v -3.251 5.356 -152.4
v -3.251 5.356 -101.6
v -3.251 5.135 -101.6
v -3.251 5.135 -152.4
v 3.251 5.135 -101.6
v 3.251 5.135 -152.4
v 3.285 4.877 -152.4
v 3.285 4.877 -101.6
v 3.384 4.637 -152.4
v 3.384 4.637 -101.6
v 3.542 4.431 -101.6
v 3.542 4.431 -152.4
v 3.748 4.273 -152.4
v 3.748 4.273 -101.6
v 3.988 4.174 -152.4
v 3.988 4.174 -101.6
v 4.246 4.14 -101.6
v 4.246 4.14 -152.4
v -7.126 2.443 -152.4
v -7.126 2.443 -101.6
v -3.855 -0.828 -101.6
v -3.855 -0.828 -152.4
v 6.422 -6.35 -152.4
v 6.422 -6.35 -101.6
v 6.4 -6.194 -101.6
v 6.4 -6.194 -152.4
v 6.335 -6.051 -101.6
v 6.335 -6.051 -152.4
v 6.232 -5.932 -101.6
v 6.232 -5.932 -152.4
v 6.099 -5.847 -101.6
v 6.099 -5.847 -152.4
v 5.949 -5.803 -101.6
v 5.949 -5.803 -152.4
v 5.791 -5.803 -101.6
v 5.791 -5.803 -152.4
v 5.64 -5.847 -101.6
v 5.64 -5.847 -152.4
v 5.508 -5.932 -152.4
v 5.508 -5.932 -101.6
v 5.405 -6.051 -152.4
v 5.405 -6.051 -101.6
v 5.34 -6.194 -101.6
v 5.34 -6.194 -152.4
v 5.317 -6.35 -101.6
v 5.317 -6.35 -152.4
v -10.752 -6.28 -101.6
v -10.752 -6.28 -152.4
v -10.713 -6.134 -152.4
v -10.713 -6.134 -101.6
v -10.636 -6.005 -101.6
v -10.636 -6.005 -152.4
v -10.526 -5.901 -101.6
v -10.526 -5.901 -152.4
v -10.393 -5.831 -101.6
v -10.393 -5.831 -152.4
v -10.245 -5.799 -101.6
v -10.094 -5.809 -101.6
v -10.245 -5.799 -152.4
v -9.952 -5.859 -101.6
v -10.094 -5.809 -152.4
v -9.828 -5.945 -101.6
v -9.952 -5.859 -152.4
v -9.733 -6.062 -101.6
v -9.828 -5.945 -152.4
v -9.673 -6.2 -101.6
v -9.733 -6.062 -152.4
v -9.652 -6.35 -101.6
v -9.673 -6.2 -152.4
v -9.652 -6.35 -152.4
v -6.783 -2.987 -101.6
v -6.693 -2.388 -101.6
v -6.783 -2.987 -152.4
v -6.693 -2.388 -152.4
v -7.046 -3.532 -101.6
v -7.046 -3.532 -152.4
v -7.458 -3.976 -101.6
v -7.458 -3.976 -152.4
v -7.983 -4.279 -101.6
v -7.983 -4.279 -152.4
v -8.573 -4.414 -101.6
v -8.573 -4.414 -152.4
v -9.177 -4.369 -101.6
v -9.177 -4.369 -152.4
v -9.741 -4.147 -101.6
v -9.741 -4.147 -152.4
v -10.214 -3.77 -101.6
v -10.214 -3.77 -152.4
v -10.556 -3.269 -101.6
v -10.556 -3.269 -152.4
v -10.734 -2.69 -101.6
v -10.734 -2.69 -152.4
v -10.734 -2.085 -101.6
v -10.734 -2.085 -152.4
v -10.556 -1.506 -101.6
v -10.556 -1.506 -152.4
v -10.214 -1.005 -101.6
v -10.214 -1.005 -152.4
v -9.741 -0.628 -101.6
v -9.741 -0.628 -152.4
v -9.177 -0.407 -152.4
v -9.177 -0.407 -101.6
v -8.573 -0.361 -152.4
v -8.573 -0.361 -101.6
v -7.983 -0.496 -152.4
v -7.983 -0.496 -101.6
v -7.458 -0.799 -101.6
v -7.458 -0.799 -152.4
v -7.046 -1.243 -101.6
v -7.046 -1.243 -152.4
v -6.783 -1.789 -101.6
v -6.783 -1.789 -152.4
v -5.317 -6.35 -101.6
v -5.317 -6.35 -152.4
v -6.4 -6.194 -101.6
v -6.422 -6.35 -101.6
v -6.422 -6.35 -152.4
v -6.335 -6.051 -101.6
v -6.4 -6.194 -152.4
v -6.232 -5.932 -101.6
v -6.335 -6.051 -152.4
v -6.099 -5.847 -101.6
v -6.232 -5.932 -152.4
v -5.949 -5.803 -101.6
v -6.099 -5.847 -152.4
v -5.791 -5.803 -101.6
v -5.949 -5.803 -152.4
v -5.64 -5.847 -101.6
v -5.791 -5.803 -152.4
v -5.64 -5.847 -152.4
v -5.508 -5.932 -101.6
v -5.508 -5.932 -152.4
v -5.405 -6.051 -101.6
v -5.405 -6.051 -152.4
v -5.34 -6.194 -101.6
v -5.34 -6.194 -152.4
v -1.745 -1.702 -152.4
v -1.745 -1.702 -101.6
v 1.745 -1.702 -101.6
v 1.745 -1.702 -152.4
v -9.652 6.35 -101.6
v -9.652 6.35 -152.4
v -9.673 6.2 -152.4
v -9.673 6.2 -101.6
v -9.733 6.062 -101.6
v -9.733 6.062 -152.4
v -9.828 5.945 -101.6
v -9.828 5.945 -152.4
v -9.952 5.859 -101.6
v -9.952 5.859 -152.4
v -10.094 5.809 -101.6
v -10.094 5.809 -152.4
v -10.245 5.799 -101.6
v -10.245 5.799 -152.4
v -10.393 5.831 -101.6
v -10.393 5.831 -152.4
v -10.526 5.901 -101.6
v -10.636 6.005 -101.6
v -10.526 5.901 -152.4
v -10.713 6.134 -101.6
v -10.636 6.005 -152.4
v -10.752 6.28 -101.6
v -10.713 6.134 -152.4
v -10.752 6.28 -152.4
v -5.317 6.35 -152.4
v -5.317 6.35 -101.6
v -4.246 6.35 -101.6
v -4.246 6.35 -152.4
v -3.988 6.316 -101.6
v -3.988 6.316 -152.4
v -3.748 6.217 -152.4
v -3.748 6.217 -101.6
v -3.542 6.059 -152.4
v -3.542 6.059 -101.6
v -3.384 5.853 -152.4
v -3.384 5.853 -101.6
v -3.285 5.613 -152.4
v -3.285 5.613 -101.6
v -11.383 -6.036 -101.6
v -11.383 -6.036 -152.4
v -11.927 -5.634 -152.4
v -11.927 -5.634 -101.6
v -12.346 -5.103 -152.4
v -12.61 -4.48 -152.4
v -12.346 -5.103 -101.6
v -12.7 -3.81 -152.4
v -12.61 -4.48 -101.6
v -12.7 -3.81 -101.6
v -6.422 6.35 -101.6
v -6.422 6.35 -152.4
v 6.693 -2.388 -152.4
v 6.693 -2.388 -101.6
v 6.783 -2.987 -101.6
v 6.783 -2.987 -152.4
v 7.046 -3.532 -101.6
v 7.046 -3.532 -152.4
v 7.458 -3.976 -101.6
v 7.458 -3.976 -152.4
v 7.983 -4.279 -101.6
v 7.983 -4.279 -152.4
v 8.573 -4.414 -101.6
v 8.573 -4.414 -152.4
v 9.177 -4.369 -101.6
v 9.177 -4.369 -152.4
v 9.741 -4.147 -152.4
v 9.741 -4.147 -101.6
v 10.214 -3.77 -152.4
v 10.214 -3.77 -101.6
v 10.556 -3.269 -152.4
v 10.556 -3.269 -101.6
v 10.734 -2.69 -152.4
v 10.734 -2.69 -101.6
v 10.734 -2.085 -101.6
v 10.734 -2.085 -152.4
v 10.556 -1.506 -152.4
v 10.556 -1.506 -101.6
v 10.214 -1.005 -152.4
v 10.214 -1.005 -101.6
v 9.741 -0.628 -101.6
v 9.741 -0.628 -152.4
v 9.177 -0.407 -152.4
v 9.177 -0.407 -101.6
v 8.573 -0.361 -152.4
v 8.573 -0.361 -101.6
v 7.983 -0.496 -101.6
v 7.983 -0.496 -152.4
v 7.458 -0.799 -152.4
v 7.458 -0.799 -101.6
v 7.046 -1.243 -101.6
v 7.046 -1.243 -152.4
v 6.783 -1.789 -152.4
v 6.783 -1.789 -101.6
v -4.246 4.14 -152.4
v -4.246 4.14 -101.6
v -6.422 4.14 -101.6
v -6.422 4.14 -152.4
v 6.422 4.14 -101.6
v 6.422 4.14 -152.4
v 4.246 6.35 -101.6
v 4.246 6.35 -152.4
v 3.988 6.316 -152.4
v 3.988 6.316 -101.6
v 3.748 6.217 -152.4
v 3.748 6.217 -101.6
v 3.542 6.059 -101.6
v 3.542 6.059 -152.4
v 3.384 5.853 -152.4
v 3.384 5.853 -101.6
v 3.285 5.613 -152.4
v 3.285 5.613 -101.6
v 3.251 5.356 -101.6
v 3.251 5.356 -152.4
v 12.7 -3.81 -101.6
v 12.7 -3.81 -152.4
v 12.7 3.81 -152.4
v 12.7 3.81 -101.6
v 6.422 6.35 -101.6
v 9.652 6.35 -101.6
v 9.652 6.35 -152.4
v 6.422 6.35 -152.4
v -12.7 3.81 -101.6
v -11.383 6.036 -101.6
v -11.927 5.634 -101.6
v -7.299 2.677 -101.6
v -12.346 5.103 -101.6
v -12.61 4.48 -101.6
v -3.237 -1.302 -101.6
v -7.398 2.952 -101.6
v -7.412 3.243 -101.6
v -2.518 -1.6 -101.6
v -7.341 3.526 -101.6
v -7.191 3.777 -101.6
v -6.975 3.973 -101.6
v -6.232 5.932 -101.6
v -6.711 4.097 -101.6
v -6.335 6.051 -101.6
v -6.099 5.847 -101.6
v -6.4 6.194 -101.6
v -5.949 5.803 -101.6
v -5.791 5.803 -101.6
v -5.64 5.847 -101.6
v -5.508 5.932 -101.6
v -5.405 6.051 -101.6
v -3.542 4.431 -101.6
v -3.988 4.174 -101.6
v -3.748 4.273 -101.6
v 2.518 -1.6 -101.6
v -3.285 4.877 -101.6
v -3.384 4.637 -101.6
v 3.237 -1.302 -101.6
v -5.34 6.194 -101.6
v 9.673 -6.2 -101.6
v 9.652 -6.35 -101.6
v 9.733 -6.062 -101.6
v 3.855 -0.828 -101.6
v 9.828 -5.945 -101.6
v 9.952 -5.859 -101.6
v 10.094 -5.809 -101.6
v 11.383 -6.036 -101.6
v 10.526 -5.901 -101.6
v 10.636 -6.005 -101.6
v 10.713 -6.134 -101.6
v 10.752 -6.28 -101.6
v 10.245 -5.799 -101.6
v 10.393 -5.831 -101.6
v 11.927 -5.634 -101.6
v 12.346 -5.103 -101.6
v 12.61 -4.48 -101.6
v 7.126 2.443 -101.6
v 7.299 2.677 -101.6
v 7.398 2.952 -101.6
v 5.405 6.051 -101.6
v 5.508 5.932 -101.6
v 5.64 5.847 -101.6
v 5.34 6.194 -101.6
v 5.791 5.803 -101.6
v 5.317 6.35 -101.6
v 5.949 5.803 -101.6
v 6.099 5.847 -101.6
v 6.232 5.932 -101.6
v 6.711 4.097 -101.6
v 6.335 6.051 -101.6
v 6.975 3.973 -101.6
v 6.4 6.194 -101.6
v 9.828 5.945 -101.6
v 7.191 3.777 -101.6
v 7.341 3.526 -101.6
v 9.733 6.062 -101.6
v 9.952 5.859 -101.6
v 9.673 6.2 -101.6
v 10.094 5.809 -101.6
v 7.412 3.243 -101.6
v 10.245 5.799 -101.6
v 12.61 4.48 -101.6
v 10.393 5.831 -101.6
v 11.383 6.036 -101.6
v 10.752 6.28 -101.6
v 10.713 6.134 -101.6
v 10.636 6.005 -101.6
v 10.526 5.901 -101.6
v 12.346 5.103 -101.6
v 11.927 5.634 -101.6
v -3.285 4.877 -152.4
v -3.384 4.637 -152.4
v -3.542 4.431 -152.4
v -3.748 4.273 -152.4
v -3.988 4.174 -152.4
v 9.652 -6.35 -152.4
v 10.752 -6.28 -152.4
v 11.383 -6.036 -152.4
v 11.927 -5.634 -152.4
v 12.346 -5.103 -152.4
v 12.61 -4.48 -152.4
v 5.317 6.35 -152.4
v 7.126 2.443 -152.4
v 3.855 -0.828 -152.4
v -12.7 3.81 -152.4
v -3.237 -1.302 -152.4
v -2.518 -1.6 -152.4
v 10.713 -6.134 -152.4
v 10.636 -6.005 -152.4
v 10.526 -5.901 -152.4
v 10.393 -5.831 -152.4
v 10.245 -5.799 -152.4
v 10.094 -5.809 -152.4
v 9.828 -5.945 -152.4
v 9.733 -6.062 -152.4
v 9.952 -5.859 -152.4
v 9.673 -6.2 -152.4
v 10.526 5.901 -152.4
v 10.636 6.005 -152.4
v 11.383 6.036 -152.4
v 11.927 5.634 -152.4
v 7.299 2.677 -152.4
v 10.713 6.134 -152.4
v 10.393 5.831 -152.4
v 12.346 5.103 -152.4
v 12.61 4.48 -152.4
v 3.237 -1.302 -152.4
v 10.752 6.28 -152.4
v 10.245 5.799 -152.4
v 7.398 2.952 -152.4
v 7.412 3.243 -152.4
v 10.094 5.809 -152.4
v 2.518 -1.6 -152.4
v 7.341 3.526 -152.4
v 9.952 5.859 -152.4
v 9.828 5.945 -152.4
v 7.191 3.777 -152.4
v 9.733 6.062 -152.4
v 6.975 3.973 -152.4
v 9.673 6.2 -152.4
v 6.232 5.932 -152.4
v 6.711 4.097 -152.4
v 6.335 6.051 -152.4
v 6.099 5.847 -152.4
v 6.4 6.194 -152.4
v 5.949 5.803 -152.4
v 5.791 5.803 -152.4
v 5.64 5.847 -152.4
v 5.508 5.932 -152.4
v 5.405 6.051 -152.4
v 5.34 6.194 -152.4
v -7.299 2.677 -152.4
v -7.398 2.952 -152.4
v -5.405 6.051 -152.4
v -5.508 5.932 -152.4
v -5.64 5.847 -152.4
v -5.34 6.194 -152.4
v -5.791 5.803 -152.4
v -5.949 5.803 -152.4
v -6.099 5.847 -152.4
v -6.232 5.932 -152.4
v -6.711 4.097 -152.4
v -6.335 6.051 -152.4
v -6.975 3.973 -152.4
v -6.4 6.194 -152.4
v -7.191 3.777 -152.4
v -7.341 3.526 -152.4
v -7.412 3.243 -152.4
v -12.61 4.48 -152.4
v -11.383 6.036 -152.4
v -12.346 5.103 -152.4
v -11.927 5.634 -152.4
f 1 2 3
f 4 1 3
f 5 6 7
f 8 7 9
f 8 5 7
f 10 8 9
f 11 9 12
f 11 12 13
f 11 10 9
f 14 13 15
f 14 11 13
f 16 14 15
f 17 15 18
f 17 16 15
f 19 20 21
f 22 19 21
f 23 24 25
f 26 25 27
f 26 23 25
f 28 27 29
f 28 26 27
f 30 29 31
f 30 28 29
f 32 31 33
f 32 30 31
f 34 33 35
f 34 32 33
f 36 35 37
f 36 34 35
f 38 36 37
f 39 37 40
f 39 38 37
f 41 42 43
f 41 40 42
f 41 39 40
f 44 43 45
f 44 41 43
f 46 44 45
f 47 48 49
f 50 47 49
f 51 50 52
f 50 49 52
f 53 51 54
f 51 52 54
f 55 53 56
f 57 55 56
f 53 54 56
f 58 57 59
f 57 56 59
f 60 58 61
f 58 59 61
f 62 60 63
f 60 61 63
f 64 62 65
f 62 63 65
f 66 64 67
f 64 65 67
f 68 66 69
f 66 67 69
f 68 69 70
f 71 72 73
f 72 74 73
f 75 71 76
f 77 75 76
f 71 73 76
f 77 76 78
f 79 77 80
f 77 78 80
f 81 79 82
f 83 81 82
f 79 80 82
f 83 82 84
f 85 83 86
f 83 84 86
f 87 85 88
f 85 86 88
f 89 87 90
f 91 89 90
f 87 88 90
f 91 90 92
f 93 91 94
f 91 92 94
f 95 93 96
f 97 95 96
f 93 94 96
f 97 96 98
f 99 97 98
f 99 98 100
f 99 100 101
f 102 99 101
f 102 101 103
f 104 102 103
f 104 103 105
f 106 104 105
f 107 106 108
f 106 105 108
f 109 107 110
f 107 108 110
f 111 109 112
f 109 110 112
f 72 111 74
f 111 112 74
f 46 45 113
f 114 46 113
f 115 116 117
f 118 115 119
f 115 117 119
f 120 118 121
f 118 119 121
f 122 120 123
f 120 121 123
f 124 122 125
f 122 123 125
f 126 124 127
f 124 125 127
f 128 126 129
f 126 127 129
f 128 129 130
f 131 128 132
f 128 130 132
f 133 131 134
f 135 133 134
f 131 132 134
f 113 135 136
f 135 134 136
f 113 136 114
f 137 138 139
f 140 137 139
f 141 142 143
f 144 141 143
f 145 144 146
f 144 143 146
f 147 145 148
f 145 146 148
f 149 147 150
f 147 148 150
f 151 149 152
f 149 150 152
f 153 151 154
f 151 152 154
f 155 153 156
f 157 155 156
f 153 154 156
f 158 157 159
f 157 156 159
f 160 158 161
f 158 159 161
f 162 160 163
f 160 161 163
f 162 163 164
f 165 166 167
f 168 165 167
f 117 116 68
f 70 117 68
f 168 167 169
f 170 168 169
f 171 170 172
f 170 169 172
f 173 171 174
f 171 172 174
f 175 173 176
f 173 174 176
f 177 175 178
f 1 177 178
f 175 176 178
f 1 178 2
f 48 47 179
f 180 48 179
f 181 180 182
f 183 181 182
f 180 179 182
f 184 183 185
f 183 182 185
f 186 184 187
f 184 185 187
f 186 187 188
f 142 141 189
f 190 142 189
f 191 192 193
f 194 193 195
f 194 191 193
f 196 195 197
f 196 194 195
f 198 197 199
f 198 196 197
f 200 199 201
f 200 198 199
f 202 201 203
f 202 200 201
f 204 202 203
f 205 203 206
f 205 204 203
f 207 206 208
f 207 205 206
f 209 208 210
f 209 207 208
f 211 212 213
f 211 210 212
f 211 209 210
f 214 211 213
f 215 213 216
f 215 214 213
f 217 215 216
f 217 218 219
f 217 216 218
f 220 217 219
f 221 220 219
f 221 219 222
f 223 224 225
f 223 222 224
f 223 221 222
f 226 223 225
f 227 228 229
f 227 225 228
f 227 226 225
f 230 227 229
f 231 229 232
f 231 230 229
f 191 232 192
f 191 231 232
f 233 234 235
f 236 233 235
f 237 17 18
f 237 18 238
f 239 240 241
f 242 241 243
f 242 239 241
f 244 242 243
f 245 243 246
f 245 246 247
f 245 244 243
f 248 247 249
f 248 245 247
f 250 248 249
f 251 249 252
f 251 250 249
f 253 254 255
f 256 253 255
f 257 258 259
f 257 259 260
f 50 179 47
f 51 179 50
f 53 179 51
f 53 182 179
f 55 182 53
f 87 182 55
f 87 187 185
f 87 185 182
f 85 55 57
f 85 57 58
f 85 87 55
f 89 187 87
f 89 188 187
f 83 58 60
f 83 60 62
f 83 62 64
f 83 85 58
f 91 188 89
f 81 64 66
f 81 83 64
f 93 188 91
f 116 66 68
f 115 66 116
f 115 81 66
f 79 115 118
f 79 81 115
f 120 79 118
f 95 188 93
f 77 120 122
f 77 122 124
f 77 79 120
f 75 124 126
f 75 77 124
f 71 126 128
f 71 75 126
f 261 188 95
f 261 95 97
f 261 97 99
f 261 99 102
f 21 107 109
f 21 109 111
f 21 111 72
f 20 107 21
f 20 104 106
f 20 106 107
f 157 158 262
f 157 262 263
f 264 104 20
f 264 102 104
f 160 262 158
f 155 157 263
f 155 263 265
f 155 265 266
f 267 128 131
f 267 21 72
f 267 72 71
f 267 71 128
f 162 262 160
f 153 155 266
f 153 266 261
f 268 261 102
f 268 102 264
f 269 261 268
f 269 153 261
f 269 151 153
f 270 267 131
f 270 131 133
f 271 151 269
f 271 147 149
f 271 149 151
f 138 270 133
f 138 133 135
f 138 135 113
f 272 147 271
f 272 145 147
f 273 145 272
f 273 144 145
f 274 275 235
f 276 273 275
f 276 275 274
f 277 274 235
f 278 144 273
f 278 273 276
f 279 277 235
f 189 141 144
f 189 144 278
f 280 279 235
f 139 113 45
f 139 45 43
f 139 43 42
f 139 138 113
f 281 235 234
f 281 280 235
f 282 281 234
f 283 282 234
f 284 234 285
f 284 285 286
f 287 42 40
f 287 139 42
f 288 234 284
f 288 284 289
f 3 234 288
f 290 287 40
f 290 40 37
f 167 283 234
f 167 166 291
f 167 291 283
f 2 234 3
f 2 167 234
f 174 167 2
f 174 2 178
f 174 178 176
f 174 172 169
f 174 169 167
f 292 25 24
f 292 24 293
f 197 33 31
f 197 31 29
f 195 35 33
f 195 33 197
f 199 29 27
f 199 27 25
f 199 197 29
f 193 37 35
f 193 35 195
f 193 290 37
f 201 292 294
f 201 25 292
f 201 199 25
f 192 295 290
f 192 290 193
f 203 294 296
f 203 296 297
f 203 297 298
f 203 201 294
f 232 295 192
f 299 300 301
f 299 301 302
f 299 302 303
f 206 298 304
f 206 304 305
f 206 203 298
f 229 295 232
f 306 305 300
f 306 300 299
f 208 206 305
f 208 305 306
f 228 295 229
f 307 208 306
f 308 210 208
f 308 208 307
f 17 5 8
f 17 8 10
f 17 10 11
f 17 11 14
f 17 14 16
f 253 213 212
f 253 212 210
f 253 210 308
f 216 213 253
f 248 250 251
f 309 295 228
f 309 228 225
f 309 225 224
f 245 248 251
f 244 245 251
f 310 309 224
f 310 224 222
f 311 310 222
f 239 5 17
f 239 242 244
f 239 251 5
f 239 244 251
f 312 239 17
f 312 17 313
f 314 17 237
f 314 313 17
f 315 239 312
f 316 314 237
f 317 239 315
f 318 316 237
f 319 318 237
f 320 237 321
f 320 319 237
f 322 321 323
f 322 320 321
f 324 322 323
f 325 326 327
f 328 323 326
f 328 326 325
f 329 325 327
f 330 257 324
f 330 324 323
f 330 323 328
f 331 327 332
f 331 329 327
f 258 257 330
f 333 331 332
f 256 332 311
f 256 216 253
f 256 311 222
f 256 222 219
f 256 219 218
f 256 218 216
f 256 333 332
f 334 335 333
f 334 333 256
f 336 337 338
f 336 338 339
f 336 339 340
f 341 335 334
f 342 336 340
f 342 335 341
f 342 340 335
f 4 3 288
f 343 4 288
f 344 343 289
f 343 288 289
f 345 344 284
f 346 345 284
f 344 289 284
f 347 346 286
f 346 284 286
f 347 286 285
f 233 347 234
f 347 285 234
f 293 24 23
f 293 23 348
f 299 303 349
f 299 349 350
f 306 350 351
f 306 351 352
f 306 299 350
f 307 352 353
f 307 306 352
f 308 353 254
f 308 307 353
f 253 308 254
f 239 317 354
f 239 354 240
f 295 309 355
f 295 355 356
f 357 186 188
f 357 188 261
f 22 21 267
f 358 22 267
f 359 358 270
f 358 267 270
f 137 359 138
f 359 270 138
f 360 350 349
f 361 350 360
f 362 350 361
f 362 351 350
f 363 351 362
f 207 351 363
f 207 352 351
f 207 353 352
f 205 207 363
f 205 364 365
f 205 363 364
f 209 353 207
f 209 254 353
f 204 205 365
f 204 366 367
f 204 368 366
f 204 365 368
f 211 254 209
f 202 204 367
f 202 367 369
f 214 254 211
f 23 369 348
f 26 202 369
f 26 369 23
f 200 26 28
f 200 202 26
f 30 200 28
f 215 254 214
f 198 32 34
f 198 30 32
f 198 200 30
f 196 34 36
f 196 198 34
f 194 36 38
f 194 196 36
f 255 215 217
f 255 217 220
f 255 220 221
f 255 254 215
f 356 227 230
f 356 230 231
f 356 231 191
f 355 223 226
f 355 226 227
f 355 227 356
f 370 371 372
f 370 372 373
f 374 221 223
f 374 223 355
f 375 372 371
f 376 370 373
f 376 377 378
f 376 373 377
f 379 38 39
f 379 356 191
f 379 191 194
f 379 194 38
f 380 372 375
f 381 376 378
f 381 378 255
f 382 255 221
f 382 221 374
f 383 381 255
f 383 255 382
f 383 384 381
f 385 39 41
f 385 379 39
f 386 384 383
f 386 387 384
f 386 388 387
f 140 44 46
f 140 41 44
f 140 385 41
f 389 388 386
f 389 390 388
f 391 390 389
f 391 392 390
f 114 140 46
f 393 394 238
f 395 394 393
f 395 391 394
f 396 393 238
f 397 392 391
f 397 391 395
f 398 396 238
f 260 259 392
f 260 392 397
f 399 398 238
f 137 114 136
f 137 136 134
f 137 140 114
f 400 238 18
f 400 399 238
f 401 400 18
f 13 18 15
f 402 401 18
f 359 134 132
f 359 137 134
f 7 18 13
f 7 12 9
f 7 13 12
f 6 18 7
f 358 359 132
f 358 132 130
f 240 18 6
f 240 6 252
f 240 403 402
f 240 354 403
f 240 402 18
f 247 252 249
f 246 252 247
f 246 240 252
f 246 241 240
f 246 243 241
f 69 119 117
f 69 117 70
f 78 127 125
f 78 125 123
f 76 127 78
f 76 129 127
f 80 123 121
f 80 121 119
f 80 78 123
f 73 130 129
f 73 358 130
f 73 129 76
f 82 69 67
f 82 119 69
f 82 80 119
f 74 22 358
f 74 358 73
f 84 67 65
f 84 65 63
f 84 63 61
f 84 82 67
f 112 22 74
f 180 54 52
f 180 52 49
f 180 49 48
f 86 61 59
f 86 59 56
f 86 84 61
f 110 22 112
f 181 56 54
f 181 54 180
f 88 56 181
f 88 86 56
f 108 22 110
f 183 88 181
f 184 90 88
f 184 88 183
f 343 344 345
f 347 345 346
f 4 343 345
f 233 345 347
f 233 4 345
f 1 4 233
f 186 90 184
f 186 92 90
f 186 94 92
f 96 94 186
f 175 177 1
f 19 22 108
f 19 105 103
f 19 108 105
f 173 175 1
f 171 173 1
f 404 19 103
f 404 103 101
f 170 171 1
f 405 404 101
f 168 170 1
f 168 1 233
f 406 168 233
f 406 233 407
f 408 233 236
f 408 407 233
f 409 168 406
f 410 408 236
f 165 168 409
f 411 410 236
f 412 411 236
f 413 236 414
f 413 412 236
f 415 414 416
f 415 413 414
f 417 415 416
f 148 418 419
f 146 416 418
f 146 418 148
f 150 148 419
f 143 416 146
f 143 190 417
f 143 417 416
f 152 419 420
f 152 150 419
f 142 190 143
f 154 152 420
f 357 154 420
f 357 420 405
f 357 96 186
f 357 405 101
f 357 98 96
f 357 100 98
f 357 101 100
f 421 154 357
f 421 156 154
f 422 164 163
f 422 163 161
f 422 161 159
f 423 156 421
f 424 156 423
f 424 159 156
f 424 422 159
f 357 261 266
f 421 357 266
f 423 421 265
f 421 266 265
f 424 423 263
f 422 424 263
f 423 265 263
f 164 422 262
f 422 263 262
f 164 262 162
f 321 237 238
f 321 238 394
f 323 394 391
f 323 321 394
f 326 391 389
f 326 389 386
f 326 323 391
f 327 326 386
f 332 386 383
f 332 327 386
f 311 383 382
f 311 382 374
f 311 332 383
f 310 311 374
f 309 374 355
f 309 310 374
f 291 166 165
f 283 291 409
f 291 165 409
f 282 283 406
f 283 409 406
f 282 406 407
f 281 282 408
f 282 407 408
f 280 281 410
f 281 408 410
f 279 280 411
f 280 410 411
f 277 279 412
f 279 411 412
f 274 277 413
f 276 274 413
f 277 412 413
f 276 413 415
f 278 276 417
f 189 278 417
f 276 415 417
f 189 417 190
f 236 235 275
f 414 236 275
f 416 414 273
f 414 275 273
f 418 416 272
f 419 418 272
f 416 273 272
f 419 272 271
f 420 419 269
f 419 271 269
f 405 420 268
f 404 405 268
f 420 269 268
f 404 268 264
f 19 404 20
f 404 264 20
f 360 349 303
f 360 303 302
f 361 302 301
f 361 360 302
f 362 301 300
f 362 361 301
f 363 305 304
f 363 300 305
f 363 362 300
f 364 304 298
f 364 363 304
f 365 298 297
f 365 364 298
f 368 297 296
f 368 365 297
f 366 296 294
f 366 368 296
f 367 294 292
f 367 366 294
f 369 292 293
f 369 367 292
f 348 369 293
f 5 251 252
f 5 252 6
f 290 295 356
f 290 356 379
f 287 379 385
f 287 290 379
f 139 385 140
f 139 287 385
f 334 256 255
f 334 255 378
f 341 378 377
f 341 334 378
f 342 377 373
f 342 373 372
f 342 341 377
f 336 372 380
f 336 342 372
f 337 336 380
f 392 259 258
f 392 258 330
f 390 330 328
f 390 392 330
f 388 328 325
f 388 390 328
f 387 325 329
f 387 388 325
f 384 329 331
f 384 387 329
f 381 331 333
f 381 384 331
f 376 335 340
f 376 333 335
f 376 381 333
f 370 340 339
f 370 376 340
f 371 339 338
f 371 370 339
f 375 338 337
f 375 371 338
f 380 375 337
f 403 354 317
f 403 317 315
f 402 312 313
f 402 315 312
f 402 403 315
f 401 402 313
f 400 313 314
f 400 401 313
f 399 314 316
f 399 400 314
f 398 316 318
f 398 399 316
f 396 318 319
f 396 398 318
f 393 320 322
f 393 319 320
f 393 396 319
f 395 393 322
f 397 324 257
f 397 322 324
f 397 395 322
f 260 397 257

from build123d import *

# Parameters (mm, degrees)
SKETCH3_R               = 2.032
BOSS_EXTRUDE1_DEPTH     = 152.4
CUT_EXTRUDE1_DEPTH      = 154.060029074
CUT_EXTRUDE1_DEPTH_BACK = 154.060029074
SKETCH4_R               = 0.55245
CUT_EXTRUDE2_DEPTH      = 254


with BuildPart() as part:
    # Sketch3 → Boss-Extrude1 (new, symmetric)
    with BuildSketch(Plane.XY):
        with BuildLine():
            Line((3.2512, 5.35559), (3.2512, 5.13461))
            ThreePointArc((3.2512, 5.13461), (3.542455946, 4.431455946), (4.24561, 4.1402))
            Line((4.24561, 4.1402), (6.42239, 4.1402))
            ThreePointArc((6.42239, 4.1402), (7.341105046, 3.526334232), (7.125544054, 2.442635946))
            Line((7.125544054, 2.442635946), (3.854875946, -0.828032163))
            ThreePointArc((3.854875946, -0.828032163), (2.887046479, -1.474715138), (1.745413783, -1.7018))
            Line((1.745413783, -1.7018), (0, -1.7018))
            Line((0, -1.7018), (0, -6.35))
            Line((0, -6.35), (10.16, -6.35))
            ThreePointArc((10.16, -6.35), (11.956051224, -5.606051224), (12.7, -3.81))
            Line((12.7, -3.81), (12.7, 3.81))
            ThreePointArc((12.7, 3.81), (11.956051224, 5.606051224), (10.16, 6.35))
            Line((10.16, 6.35), (4.24561, 6.35))
            ThreePointArc((4.24561, 6.35), (3.542455946, 6.058744054), (3.2512, 5.35559))
        make_face()
        with Locations(Location((8.7249, -2.3876, 0), (0, 0, 180))):
            Circle(SKETCH3_R, mode=Mode.SUBTRACT)
    extrude(amount=BOSS_EXTRUDE1_DEPTH, both=True)

    # Sketch4 → Cut-Extrude1 (cut, two sides: drawn at the far end of the back side and taken through both)
    with BuildSketch(Plane.XY.offset(-CUT_EXTRUDE1_DEPTH_BACK)):
        with Locations((5.86994, 6.35)):
            Circle(SKETCH4_R)
        with Locations((10.20445, 6.35)):
            Circle(SKETCH4_R)
        with Locations((5.86994, -6.35)):
            Circle(SKETCH4_R)
        with Locations((10.20445, -6.35)):
            Circle(SKETCH4_R)
    extrude(amount=CUT_EXTRUDE1_DEPTH + CUT_EXTRUDE1_DEPTH_BACK, mode=Mode.SUBTRACT)

    # Mirror1: part across plane


with BuildPart() as part_1:
    add(part.part)
    add(part.part.mirror(Plane(origin=(0, 0, 0), x_dir=(0, 0, 1), z_dir=(1, 0, 0))))

    # Sketch5 → Cut-Extrude2 (cut)
    with BuildSketch(Plane.XY.offset(152.4)):
        with BuildLine():
            Line((9.652, 6.35), (6.42239, 6.35))
            ThreePointArc((6.42239, 6.35), (5.86994, 5.79755), (5.31749, 6.35))
            Line((5.31749, 6.35), (4.24561, 6.35))
            ThreePointArc((4.24561, 6.35), (3.542455946, 6.058744054), (3.2512, 5.35559))
            Line((3.2512, 5.35559), (3.2512, 5.13461))
            ThreePointArc((3.2512, 5.13461), (3.542455946, 4.431455946), (4.24561, 4.1402))
            Line((4.24561, 4.1402), (6.42239, 4.1402))
            ThreePointArc((6.42239, 4.1402), (7.341105046, 3.526334232), (7.125544054, 2.442635946))
            Line((7.125544054, 2.442635946), (3.854875946, -0.828032163))
            ThreePointArc((3.854875946, -0.828032163), (2.887046479, -1.474715138), (1.745413783, -1.7018))
            Line((1.745413783, -1.7018), (-1.745413783, -1.7018))
            ThreePointArc((-1.745413783, -1.7018), (-2.887046479, -1.474715138), (-3.854875946, -0.828032163))
            Line((-3.854875946, -0.828032163), (-7.125544054, 2.442635946))
            ThreePointArc((-7.125544054, 2.442635946), (-7.341105046, 3.526334232), (-6.42239, 4.1402))
            Line((-6.42239, 4.1402), (-4.24561, 4.1402))
            ThreePointArc((-4.24561, 4.1402), (-3.542455946, 4.431455946), (-3.2512, 5.13461))
            Line((-3.2512, 5.13461), (-3.2512, 5.35559))
            ThreePointArc((-3.2512, 5.35559), (-3.542455946, 6.058744054), (-4.24561, 6.35))
            Line((-4.24561, 6.35), (-5.31749, 6.35))
            ThreePointArc((-5.31749, 6.35), (-5.86994, 5.79755), (-6.42239, 6.35))
            Line((-6.42239, 6.35), (-9.652, 6.35))
            ThreePointArc((-9.652, 6.35), (-10.169350236, 5.798666155), (-10.752439892, 6.279942302))
            ThreePointArc((-10.752439892, 6.279942302), (-12.154542219, 5.382705102), (-12.7, 3.81))
            Line((-12.7, 3.81), (-12.7, -3.81))
            ThreePointArc((-12.7, -3.81), (-12.154542219, -5.382705102), (-10.752439892, -6.279942302))
            ThreePointArc((-10.752439892, -6.279942302), (-10.169350236, -5.798666155), (-9.652, -6.35))
            Line((-9.652, -6.35), (-6.42239, -6.35))
            ThreePointArc((-6.42239, -6.35), (-5.86994, -5.79755), (-5.31749, -6.35))
            Line((-5.31749, -6.35), (5.31749, -6.35))
            ThreePointArc((5.31749, -6.35), (5.86994, -5.79755), (6.42239, -6.35))
            Line((6.42239, -6.35), (9.652, -6.35))
            ThreePointArc((9.652, -6.35), (10.169350236, -5.798666155), (10.752439892, -6.279942302))
            ThreePointArc((10.752439892, -6.279942302), (12.154542219, -5.382705102), (12.7, -3.81))
            Line((12.7, -3.81), (12.7, 3.81))
            ThreePointArc((12.7, 3.81), (12.154542219, 5.382705102), (10.752439892, 6.279942302))
            ThreePointArc((10.752439892, 6.279942302), (10.169350236, 5.798666155), (9.652, 6.35))
        make_face()
    extrude(amount=-CUT_EXTRUDE2_DEPTH, mode=Mode.SUBTRACT)


solid = part_1.part
